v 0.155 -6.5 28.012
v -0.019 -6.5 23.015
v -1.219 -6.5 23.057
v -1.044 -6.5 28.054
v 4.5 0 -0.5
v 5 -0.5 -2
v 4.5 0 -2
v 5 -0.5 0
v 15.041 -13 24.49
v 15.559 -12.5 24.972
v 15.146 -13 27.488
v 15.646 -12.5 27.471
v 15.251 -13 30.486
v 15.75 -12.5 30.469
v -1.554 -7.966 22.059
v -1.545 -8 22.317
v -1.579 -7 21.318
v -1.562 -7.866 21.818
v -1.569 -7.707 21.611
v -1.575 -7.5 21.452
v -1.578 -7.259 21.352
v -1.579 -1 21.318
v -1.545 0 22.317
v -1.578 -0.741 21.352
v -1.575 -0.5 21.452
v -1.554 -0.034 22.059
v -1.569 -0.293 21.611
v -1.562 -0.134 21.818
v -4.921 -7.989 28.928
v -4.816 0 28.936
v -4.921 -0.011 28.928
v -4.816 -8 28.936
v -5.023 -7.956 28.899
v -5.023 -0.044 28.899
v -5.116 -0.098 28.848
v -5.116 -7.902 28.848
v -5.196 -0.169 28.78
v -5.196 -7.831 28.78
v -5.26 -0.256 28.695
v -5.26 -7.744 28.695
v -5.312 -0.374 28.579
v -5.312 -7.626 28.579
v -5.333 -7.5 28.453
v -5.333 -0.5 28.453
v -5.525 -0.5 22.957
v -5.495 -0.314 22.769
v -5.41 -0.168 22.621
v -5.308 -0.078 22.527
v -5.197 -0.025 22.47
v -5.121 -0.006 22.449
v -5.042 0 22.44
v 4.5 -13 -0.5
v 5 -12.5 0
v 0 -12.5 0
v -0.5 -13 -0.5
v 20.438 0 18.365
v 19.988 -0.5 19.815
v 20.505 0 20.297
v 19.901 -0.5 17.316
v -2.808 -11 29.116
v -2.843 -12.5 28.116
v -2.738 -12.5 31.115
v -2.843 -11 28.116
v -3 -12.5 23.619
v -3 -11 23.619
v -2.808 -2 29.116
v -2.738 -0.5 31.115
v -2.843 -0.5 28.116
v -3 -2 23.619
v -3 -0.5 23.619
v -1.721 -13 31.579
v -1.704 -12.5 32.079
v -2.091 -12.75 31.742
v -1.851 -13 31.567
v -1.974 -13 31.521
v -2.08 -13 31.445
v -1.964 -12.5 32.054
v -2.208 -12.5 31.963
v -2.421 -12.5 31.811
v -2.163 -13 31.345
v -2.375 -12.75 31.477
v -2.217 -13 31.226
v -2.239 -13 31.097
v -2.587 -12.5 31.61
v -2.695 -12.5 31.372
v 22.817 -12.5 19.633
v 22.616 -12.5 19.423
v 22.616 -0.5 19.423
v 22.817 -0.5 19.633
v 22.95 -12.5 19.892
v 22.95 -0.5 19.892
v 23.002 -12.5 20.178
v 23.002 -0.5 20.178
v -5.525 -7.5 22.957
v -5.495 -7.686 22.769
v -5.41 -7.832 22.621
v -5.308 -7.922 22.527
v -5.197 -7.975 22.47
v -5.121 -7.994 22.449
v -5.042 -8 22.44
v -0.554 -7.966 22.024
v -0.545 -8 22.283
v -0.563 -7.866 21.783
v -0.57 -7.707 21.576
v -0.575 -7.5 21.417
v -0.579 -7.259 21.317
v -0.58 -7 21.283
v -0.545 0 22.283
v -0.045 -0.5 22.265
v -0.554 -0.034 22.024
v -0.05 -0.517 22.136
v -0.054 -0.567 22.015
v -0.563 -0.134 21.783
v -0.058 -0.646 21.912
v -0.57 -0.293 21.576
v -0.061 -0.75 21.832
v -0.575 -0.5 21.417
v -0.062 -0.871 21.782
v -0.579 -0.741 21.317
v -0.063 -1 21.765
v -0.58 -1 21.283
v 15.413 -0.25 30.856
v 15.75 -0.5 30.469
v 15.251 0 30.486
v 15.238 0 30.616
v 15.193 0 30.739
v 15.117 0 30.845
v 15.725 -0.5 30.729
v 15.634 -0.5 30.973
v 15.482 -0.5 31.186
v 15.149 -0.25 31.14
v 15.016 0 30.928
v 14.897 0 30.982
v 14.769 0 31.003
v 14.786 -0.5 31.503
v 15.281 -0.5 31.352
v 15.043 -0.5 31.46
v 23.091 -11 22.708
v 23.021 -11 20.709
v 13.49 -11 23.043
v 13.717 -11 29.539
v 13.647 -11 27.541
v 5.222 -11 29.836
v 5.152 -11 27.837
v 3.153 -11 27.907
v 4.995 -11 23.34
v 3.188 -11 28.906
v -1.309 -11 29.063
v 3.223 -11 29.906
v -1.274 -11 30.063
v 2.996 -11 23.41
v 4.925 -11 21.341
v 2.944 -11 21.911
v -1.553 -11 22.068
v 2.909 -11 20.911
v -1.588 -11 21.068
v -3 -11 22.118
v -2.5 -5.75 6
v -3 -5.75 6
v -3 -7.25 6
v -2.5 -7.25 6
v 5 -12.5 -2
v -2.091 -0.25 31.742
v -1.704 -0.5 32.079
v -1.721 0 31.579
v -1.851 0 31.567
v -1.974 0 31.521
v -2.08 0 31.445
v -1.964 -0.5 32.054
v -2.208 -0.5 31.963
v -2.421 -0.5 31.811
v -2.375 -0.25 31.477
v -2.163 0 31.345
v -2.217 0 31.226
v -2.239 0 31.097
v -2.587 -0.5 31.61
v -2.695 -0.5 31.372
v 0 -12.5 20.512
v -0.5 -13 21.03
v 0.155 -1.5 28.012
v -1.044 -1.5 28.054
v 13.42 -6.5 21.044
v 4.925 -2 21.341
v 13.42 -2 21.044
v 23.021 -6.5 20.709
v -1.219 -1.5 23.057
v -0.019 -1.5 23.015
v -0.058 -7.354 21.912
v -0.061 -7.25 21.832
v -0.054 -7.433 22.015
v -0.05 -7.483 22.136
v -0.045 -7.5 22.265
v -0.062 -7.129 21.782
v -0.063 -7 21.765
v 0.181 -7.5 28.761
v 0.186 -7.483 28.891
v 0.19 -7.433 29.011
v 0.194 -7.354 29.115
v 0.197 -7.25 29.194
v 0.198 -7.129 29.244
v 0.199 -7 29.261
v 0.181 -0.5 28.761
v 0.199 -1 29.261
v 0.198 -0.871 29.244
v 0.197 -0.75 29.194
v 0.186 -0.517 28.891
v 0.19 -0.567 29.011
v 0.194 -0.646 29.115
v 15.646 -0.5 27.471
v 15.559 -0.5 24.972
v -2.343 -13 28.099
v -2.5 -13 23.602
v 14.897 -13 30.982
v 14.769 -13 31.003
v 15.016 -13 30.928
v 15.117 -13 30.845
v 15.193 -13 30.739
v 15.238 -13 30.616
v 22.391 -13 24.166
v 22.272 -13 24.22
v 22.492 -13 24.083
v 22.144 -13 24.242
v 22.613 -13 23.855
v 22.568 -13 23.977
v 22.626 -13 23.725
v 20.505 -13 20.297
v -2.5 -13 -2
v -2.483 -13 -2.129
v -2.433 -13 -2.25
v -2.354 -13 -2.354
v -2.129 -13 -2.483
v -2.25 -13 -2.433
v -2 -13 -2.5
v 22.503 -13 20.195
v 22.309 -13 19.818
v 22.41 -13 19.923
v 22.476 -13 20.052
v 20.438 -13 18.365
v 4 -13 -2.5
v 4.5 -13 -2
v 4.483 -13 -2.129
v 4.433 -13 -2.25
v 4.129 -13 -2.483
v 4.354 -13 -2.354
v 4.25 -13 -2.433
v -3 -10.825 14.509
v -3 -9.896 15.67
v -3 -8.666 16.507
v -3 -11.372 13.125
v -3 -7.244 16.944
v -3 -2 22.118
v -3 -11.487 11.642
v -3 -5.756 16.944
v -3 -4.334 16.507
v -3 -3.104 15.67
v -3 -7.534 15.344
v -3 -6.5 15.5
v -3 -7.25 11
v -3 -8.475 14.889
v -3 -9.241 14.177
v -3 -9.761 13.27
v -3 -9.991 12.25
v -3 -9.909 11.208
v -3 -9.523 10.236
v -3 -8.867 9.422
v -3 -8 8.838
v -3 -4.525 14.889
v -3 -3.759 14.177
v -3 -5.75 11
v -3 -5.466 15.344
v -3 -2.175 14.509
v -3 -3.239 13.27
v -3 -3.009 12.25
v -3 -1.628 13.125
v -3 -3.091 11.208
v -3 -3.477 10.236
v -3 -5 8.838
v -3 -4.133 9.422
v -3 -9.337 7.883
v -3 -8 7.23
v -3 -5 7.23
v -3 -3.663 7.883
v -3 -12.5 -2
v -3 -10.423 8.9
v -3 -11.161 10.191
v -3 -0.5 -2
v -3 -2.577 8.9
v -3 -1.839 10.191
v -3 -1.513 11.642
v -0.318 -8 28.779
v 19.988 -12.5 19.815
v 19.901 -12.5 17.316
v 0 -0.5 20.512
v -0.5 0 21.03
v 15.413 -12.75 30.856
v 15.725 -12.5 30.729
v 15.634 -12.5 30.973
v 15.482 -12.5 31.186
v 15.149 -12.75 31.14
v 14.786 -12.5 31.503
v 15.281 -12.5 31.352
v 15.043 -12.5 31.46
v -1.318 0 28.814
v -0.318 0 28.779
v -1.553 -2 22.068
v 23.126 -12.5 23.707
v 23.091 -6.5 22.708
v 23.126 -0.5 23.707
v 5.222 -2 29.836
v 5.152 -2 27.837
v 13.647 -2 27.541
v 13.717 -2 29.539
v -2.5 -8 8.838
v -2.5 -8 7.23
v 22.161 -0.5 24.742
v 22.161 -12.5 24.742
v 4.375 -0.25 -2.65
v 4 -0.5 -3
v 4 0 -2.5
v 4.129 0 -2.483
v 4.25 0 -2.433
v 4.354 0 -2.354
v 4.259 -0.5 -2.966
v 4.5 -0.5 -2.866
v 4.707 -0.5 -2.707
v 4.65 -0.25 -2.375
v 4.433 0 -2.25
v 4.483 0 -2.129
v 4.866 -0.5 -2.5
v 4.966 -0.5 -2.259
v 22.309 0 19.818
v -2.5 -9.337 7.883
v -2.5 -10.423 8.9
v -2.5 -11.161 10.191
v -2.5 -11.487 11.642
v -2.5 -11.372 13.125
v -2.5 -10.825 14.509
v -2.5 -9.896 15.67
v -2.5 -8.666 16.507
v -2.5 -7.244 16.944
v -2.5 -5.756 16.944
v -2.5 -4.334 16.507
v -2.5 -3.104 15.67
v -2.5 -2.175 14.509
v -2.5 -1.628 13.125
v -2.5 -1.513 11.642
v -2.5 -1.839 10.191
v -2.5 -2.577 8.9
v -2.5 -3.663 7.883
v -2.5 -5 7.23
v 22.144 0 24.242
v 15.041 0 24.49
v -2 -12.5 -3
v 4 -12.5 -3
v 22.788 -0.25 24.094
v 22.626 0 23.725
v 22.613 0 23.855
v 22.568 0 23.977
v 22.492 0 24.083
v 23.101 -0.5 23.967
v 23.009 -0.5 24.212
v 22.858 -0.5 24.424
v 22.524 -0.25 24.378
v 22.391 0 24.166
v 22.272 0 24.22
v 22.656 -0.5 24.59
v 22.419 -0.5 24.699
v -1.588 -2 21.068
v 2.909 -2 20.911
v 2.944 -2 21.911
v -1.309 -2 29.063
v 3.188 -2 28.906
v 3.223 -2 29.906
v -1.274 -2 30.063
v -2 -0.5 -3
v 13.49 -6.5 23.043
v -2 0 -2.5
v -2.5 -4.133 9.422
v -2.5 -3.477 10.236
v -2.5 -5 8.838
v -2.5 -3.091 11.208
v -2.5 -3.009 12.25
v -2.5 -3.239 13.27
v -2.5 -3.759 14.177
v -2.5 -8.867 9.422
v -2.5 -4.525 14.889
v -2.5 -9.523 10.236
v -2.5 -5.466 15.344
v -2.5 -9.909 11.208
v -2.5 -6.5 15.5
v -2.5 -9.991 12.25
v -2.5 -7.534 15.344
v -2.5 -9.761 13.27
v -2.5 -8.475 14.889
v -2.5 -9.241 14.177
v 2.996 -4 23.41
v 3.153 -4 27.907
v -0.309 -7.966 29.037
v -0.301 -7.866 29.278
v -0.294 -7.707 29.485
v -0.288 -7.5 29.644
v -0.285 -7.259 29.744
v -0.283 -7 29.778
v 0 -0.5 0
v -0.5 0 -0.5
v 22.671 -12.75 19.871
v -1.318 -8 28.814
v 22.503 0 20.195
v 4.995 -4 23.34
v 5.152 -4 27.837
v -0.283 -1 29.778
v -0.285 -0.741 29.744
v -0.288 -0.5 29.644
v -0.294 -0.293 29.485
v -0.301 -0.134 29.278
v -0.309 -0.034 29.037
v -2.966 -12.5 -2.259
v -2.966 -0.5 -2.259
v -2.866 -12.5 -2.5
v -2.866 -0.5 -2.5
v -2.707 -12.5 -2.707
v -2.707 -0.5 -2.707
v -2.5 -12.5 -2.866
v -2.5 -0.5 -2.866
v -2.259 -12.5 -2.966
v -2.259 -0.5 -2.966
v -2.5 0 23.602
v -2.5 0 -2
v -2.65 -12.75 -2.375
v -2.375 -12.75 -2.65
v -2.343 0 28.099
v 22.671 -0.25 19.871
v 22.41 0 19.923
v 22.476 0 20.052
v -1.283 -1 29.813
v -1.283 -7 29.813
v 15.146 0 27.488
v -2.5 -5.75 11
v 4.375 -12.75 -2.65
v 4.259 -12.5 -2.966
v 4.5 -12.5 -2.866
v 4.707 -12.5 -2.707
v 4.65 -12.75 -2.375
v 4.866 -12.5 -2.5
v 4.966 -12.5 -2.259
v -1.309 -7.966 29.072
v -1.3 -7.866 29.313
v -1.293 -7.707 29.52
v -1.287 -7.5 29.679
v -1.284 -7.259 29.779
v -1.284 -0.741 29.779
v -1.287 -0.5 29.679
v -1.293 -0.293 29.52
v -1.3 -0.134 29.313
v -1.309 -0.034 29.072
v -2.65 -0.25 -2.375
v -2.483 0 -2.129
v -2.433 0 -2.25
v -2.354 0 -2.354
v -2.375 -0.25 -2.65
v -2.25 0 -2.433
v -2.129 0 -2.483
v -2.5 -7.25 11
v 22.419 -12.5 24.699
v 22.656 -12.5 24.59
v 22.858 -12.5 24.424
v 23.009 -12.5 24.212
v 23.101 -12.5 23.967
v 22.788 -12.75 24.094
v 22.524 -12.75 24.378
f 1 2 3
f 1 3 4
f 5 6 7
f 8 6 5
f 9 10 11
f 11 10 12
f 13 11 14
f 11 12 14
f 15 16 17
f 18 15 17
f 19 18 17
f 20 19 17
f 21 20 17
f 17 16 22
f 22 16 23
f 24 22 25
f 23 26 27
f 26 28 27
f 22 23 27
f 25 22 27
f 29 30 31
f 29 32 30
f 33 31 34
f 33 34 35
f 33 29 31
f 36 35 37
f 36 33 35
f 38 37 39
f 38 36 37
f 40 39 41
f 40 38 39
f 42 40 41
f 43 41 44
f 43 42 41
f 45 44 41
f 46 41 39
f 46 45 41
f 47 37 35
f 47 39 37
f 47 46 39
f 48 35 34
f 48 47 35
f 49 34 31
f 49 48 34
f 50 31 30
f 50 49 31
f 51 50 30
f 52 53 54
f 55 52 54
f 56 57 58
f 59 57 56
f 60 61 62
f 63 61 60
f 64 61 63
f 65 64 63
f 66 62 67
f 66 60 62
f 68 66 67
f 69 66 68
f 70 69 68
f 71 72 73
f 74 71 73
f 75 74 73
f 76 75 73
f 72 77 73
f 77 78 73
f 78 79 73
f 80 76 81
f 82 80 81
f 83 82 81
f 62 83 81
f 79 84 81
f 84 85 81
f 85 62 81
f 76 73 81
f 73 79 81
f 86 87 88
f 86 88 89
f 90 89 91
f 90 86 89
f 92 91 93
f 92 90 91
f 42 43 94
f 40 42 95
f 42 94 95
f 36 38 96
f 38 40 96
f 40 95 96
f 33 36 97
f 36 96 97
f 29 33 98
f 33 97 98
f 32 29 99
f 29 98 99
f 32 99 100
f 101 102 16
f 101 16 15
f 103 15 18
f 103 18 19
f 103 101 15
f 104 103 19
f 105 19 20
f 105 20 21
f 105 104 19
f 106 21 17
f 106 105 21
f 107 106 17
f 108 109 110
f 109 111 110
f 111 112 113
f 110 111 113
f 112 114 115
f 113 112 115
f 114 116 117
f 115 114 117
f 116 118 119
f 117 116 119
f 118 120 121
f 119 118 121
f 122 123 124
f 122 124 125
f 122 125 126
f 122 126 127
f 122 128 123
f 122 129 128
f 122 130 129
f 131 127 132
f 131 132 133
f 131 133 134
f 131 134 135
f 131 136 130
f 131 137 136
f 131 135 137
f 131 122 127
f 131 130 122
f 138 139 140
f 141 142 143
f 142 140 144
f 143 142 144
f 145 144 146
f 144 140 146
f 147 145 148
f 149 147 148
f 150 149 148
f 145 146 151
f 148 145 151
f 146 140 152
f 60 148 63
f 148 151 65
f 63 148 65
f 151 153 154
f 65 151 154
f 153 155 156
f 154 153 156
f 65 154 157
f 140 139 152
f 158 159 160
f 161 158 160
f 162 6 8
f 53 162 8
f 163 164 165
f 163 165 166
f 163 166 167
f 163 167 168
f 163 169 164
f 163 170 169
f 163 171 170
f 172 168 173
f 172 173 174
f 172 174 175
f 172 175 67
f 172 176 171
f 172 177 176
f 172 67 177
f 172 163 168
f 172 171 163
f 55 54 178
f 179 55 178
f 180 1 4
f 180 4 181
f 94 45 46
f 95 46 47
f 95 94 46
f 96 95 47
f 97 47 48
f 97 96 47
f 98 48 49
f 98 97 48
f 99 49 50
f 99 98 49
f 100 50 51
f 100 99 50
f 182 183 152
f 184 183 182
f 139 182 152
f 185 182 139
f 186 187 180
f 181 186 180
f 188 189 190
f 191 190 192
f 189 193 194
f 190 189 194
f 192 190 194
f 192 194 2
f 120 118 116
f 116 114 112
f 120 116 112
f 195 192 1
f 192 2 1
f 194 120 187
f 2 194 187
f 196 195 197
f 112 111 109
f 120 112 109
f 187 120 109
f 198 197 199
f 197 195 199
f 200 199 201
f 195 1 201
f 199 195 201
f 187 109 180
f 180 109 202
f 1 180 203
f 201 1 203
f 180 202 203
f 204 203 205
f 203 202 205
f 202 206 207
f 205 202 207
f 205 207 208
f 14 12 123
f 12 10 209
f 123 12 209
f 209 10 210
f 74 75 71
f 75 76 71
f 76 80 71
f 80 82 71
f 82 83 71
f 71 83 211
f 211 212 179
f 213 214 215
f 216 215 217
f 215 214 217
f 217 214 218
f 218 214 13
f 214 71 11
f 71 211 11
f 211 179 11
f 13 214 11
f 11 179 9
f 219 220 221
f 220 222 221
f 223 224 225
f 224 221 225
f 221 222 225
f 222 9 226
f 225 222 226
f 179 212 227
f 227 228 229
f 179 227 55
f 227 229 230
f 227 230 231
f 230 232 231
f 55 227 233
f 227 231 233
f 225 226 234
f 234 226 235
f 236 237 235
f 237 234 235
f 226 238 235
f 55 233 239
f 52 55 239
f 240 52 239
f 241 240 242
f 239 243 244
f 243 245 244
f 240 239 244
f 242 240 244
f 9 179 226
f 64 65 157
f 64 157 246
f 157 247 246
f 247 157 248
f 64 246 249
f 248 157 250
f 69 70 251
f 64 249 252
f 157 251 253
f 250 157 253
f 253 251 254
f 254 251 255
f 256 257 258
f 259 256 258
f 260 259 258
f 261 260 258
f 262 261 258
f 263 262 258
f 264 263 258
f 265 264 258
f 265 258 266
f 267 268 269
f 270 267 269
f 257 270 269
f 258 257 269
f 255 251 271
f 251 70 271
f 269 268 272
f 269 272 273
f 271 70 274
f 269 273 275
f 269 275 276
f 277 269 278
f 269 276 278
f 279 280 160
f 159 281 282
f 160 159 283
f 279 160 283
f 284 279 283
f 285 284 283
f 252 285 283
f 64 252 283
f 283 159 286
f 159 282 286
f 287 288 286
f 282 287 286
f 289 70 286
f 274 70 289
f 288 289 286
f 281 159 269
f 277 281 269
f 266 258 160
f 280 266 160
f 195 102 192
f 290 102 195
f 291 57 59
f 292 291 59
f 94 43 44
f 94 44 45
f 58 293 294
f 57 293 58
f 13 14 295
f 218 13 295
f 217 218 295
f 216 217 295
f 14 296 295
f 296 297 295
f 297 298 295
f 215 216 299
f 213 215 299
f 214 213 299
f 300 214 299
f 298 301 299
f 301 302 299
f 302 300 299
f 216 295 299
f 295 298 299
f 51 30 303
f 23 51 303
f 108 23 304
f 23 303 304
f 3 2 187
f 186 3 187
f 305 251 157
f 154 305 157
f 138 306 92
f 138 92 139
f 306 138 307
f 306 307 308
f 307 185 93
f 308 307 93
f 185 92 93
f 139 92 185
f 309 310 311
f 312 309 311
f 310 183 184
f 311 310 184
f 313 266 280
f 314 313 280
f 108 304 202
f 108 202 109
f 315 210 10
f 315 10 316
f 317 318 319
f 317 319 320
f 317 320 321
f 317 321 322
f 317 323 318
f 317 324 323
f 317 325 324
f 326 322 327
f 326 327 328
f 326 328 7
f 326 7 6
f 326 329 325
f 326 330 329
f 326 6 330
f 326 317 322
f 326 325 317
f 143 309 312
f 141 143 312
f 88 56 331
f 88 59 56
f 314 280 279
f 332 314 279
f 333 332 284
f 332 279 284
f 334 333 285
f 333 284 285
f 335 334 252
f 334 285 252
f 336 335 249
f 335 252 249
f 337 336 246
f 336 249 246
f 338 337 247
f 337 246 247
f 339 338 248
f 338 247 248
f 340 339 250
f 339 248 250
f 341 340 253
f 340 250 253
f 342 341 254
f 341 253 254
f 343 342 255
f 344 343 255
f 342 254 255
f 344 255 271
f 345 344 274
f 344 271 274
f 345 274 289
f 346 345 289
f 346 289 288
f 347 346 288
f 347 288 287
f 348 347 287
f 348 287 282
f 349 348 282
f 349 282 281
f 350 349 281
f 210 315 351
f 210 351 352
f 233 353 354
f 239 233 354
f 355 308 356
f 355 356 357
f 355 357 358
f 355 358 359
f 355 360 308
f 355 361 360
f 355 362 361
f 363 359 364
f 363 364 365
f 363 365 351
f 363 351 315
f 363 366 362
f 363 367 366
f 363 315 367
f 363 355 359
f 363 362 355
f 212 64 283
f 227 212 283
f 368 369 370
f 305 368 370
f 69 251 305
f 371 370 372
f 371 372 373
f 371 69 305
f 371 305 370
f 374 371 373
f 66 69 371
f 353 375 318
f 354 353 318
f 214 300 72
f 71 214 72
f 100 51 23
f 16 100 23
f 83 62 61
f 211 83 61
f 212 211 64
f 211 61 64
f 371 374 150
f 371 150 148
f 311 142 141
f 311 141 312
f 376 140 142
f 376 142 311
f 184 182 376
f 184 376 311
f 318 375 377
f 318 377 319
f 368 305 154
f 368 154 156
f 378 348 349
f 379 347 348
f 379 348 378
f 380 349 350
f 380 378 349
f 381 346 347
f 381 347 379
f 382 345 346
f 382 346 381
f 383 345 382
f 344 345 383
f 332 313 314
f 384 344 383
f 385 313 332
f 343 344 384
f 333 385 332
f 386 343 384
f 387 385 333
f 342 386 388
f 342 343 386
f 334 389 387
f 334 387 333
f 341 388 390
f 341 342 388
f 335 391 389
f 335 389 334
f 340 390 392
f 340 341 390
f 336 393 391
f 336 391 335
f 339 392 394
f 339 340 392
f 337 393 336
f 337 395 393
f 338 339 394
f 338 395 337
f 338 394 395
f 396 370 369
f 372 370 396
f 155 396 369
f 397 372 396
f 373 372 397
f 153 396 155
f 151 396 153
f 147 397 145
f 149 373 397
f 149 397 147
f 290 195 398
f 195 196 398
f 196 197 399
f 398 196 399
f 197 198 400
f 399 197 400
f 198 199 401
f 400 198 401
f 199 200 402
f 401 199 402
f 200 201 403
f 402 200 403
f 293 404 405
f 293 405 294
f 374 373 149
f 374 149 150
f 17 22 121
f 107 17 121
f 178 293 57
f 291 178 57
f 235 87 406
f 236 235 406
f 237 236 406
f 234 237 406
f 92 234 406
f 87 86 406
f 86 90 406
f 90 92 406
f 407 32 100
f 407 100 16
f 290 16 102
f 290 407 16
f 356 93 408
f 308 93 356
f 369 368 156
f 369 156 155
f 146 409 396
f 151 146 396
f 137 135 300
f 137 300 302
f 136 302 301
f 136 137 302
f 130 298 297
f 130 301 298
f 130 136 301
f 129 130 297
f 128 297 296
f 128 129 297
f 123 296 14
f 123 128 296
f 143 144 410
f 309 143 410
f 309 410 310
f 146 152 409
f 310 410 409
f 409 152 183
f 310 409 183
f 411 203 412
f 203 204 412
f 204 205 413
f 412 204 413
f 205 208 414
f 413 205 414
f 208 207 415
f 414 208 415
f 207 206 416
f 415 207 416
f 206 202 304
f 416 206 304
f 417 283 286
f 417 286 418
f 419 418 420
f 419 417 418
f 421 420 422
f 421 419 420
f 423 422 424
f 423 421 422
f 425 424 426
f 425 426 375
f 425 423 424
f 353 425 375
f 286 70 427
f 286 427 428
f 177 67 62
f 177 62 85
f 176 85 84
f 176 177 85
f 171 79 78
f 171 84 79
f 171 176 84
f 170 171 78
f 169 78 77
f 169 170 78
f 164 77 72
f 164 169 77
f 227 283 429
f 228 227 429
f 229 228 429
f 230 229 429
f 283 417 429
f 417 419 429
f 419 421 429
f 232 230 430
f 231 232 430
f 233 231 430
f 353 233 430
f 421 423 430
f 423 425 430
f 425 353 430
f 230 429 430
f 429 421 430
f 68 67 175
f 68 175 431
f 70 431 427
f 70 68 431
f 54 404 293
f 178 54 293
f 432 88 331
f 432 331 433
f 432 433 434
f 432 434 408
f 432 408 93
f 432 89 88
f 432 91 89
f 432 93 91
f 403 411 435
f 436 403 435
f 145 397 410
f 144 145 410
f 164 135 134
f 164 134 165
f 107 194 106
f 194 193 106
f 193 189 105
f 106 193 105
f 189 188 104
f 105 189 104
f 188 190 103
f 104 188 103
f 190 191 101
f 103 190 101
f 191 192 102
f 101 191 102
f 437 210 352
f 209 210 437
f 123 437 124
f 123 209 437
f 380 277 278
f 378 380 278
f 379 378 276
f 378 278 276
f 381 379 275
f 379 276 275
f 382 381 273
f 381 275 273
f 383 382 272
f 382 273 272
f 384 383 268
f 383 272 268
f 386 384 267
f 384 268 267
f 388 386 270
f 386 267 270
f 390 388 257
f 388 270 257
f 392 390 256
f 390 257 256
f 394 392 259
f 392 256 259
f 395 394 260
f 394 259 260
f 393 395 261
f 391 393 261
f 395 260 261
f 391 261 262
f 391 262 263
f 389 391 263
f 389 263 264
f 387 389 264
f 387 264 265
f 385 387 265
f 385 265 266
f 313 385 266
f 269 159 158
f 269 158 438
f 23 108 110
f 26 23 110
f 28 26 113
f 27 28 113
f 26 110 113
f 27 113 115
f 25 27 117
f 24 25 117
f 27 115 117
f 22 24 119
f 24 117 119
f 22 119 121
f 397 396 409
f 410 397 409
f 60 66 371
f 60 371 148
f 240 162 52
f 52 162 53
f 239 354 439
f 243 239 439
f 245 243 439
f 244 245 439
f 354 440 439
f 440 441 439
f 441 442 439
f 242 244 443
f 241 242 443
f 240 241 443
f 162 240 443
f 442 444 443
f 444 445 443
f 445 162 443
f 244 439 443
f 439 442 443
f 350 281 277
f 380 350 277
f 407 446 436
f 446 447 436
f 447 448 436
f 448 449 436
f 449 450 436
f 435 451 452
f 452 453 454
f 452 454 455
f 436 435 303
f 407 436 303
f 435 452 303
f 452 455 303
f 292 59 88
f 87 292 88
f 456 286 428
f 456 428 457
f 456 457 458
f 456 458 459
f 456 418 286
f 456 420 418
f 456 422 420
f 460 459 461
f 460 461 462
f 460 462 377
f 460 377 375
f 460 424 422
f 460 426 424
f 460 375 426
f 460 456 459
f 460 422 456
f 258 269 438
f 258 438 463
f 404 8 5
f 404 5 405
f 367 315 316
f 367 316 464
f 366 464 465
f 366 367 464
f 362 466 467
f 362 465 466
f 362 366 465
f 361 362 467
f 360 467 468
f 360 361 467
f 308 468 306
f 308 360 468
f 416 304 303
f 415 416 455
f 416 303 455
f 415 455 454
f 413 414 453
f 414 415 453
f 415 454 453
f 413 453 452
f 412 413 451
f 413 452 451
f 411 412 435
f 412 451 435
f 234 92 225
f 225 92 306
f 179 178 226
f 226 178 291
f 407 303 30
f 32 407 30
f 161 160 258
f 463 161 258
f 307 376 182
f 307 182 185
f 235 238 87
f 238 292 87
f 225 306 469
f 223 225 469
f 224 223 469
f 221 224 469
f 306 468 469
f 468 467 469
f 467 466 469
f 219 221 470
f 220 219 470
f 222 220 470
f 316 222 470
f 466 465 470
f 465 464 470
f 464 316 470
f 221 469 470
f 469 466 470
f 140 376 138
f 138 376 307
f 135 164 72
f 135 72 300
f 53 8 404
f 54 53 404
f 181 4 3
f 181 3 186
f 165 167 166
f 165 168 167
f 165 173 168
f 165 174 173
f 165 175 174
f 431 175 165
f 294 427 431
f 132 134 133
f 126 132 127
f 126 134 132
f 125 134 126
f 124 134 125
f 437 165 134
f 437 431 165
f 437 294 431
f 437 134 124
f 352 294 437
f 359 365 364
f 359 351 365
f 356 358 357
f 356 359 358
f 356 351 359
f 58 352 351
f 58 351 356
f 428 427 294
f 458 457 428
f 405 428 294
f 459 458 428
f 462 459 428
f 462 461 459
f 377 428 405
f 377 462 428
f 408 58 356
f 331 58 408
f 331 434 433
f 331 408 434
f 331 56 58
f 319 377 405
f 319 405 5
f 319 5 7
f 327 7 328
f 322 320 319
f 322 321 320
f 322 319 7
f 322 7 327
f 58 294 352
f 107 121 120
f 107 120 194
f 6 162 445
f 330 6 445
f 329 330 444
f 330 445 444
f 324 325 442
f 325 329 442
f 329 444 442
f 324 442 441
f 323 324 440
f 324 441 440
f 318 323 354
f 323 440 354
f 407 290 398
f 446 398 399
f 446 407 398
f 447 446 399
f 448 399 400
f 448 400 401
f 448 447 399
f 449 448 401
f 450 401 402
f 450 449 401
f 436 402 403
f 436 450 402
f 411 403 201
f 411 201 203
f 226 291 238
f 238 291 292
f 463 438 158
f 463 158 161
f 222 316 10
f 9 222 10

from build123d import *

# Parameters (mm, degrees)
F1_DEPTH  = 13
F2_R      = 1
F3_W      = 9.6065909414
F3_H      = 4.5
F4_DEPTH  = 2
F6_DEPTH  = 2
F9_DEPTH  = 4.5
F10_W     = 18.5
F10_H     = 13
F10_W_2   = 8.5
F10_H_2   = 9
F11_DEPTH = 2
F12_W     = 18.5
F12_H     = 13
F13_DEPTH = 2
F14_W     = 9
F14_H     = 7
F15_DEPTH = 6
F17_DEPTH = 9
F19_DEPTH = 8
F20_R     = 0.5
F21_R     = 1
F22_SIZE  = 0.5
F23_W     = 1.5
F23_H     = 5
F24_DEPTH = 0.5
F25_R     = 1
F26_SIZE  = 0.5
F27_W     = 5
F27_H     = 5
F28_DEPTH = 1.2


with BuildPart() as f1:
    # F0 (on Front) → F1 (new body)
    with BuildSketch(Plane.XZ):
        Polygon((5, -3), (5, 0), (0, 0), (0, 20.5124956581), (19.9878165404, 19.8145057241), (19.9005677986, 17.3160286565), (22.9859890214, 19.709807234), (23.0906875115, 22.707979715), (-3, 23.6190865995), (-3, -3), align=None)
    extrude(amount=F1_DEPTH)

    # F2
    f2_edges = [f1.edges().sort_by_distance(p)[0] for p in [
        (5, -6.5, -3),
        (22.985989, -6.5, 19.709807),
    ]]
    fillet(f2_edges, radius=F2_R)

    # F3 (on face) → F4 (cut)
    with BuildSketch(Plane(origin=(0.8201381725, 0, 23.4856844349), x_dir=(0.999390827, 0, -0.0348994967), z_dir=(0.0348994967, 0, 0.999390827))):
        Polygon((12.677533284, -2), (4.177533284, -2), (4.177533284, -11), (12.677533284, -11), (12.677533284, -6.5), align=None)
        with Locations((17.4808287547, -8.75)):
            Rectangle(F3_W, F3_H)
    extrude(amount=-F4_DEPTH, mode=Mode.SUBTRACT)

    # F5 (on face) → F6 (join)
    with BuildSketch(Plane(origin=(0.8201381725, 0, 23.4856844349), x_dir=(0.999390827, 0, -0.0348994967), z_dir=(0.0348994967, 0, 0.999390827))):
        Polygon((14.677533284, -4.5), (14.677533284, -13), (22.2841242254, -13), (22.2841242254, -4.4835860828), (22.2841242254, 0), (14.677533284, 0), align=None)
    extrude(amount=F6_DEPTH)

    # F8 (on face) → F9 (join)
    with BuildSketch(Plane(origin=(0.8201381725, 0, 23.4856844349), x_dir=(0.999390827, 0, -0.0348994967), z_dir=(0.0348994967, 0, 0.999390827))):
        Polygon((-3.822466716, -13), (14.677533284, -13), (14.677533284, 0), (-3.822466716, 0), (-3.822466716, -4), (4.177533284, -4), (4.177533284, -2), (12.677533284, -2), (12.677533284, -11), (4.177533284, -11), (-3.822466716, -11), align=None)
    extrude(amount=F9_DEPTH)

    # F10 (on face) → F11 (join)
    with BuildSketch(Plane(origin=(0.9771859077, 0, 27.9829431565), x_dir=(0.999390827, 0, -0.0348994967), z_dir=(0.0348994967, 0, 0.999390827))):
        with Locations((5.427533284, -6.5)):
            Rectangle(F10_W, F10_H)
        with Locations((8.427533284, -6.5)):
            Rectangle(F10_W_2, F10_H_2, mode=Mode.SUBTRACT)
    extrude(amount=F11_DEPTH)

    # F12 (on face) → F13 (join)
    with BuildSketch(Plane(origin=(1.0469849011, 0, 29.9817248106), x_dir=(0.999390827, 0, -0.0348994967), z_dir=(0.0348994967, 0, 0.999390827))):
        with Locations((5.427533284, -6.5)):
            Rectangle(F12_W, F12_H)
    extrude(amount=F13_DEPTH)

    # F14 (on face) → F15 (cut)
    with BuildSketch(Plane(origin=(-3.8201381725, 0, 0.1334021645), x_dir=(0, -1, 0), z_dir=(-0.999390827, 0, 0.0348994967))):
        with Locations((6.5, 25.5)):
            Rectangle(F14_W, F14_H)
    extrude(amount=-F15_DEPTH, mode=Mode.SUBTRACT)

    # F16 (on face) → F17 (cut, through all)
    with BuildSketch(Plane.XZ.offset(2)):
        Polygon((3.2231916907, 29.9057299949), (-1.2740670309, 30.0627777301), (-1.5881625012, 21.0682602869), (2.9090962204, 20.9112125517), align=None)
    extrude(amount=F17_DEPTH, mode=Mode.SUBTRACT)

    # F23 (on face) → F24 (cut)
    with BuildSketch(Plane(origin=(-3, 0, 0), x_dir=(0, -1, 0), z_dir=(-1, 0, 0))):
        with Locations((6.5, 8.5)):
            Rectangle(F23_W, F23_H)
        with BuildLine():
            Line((8, 8.8377223398), (8, 7.2303039929))
            ThreePointArc((8, 7.2303039929), (6.5, 17), (5, 7.2303039929))
            Line((5, 7.2303039929), (5, 8.8377223398))
            ThreePointArc((5, 8.8377223398), (6.5, 15.5), (8, 8.8377223398))
        make_face()
    extrude(amount=-F24_DEPTH, mode=Mode.SUBTRACT)

    # F25
    f25_edges = [f1.edges().sort_by_distance(p)[0] for p in [
        (-3, -6.5, -3),
        (-2.703354, -6.5, 32.113909),
        (15.785376, -6.5, 31.468268),
        (23.160487, -6.5, 24.706761),
    ]]
    fillet(f25_edges, radius=F25_R)

    # F26
    f26_edges = [f1.edges().sort_by_distance(p)[0] for p in [
        (1, -13, -3),
        (-2.707107, -13, -2.707107),
        (4.707107, -13, -2.707107),
        (-3, -13, 10.809543),
        (5, -13, -1),
        (-2.869127, -13, 27.366802),
        (2.5, -13, 0),
        (-2.420861, -13, 31.810972),
        (0, -13, 10.256248),
        (6.541011, -13, 31.791088),
        (9.993908, -13, 20.163501),
        (15.482439, -13, 31.185775),
        (19.944192, -13, 18.565267),
        (15.654503, -13, 27.720552),
        (21.258248, -13, 18.369365),
        (18.859812, -13, 24.856944),
        (22.893179, -13, 19.757295),
        (22.85755, -13, 24.424268),
        (23.063961, -13, 21.942634),
        (1, 0, -3),
        (-2.707107, 0, -2.707107),
        (4.707107, 0, -2.707107),
        (-3, 0, 10.809543),
        (5, 0, -1),
        (-2.869127, 0, 27.366802),
        (2.5, 0, 0),
        (-2.420861, 0, 31.810972),
        (0, 0, 10.256248),
        (6.541011, 0, 31.791088),
        (9.993908, 0, 20.163501),
        (15.482439, 0, 31.185775),
        (19.944192, 0, 18.565267),
        (15.654503, 0, 27.720552),
        (21.258248, 0, 18.369365),
        (18.859812, 0, 24.856944),
        (22.893179, 0, 19.757295),
        (22.85755, 0, 24.424268),
        (23.063961, 0, 21.942634),
    ]]
    chamfer(f26_edges, length=F26_SIZE)


with BuildPart() as f19:
    # F18 (on Front) → F19 (new body)
    with BuildSketch(Plane.XZ):
        Polygon((-0.0803513865, 21.2657587486), (0.2162943354, 29.7605807783), (-1.2827919051, 29.8129300233), (-1.3176914018, 28.8135391963), (-5.3152547099, 28.9531371831), (-5.5421014384, 22.4570968075), (-1.5445381303, 22.3174988207), (-1.5794376271, 21.3181079937), align=None)
    extrude(amount=F19_DEPTH)

    # F20
    f20_edges = [f19.edges().sort_by_distance(p)[0] for p in [
        (-5.315255, -4, 28.953137),
        (-5.542101, -4, 22.457097),
        (-5.428678, 0, 25.705117),
        (-5.428678, -8, 25.705117),
    ]]
    fillet(f20_edges, radius=F20_R)

    # F21
    f21_edges = [f19.edges().sort_by_distance(p)[0] for p in [
        (-0.533249, -8, 29.786755),
        (-0.533249, 0, 29.786755),
        (-0.829895, 0, 21.291933),
        (-0.829895, -8, 21.291933),
    ]]
    fillet(f21_edges, radius=F21_R)

    # F22
    f22_edges = [f19.edges().sort_by_distance(p)[0] for p in [
        (0.067971, -8, 25.51317),
    ]]
    chamfer(f22_edges, length=F22_SIZE)

    # F27 (on face) → F28 (cut)
    with BuildSketch(Plane(origin=(-0.8219656915, 0, 0.0287036744), x_dir=(0, 1, 0), z_dir=(0.999390827, 0, -0.0348994967))):
        with Locations((-4, 25.5)):
            Rectangle(F27_W, F27_H)
    extrude(amount=-F28_DEPTH, mode=Mode.SUBTRACT)


solid = Compound([f1.part, f19.part])
